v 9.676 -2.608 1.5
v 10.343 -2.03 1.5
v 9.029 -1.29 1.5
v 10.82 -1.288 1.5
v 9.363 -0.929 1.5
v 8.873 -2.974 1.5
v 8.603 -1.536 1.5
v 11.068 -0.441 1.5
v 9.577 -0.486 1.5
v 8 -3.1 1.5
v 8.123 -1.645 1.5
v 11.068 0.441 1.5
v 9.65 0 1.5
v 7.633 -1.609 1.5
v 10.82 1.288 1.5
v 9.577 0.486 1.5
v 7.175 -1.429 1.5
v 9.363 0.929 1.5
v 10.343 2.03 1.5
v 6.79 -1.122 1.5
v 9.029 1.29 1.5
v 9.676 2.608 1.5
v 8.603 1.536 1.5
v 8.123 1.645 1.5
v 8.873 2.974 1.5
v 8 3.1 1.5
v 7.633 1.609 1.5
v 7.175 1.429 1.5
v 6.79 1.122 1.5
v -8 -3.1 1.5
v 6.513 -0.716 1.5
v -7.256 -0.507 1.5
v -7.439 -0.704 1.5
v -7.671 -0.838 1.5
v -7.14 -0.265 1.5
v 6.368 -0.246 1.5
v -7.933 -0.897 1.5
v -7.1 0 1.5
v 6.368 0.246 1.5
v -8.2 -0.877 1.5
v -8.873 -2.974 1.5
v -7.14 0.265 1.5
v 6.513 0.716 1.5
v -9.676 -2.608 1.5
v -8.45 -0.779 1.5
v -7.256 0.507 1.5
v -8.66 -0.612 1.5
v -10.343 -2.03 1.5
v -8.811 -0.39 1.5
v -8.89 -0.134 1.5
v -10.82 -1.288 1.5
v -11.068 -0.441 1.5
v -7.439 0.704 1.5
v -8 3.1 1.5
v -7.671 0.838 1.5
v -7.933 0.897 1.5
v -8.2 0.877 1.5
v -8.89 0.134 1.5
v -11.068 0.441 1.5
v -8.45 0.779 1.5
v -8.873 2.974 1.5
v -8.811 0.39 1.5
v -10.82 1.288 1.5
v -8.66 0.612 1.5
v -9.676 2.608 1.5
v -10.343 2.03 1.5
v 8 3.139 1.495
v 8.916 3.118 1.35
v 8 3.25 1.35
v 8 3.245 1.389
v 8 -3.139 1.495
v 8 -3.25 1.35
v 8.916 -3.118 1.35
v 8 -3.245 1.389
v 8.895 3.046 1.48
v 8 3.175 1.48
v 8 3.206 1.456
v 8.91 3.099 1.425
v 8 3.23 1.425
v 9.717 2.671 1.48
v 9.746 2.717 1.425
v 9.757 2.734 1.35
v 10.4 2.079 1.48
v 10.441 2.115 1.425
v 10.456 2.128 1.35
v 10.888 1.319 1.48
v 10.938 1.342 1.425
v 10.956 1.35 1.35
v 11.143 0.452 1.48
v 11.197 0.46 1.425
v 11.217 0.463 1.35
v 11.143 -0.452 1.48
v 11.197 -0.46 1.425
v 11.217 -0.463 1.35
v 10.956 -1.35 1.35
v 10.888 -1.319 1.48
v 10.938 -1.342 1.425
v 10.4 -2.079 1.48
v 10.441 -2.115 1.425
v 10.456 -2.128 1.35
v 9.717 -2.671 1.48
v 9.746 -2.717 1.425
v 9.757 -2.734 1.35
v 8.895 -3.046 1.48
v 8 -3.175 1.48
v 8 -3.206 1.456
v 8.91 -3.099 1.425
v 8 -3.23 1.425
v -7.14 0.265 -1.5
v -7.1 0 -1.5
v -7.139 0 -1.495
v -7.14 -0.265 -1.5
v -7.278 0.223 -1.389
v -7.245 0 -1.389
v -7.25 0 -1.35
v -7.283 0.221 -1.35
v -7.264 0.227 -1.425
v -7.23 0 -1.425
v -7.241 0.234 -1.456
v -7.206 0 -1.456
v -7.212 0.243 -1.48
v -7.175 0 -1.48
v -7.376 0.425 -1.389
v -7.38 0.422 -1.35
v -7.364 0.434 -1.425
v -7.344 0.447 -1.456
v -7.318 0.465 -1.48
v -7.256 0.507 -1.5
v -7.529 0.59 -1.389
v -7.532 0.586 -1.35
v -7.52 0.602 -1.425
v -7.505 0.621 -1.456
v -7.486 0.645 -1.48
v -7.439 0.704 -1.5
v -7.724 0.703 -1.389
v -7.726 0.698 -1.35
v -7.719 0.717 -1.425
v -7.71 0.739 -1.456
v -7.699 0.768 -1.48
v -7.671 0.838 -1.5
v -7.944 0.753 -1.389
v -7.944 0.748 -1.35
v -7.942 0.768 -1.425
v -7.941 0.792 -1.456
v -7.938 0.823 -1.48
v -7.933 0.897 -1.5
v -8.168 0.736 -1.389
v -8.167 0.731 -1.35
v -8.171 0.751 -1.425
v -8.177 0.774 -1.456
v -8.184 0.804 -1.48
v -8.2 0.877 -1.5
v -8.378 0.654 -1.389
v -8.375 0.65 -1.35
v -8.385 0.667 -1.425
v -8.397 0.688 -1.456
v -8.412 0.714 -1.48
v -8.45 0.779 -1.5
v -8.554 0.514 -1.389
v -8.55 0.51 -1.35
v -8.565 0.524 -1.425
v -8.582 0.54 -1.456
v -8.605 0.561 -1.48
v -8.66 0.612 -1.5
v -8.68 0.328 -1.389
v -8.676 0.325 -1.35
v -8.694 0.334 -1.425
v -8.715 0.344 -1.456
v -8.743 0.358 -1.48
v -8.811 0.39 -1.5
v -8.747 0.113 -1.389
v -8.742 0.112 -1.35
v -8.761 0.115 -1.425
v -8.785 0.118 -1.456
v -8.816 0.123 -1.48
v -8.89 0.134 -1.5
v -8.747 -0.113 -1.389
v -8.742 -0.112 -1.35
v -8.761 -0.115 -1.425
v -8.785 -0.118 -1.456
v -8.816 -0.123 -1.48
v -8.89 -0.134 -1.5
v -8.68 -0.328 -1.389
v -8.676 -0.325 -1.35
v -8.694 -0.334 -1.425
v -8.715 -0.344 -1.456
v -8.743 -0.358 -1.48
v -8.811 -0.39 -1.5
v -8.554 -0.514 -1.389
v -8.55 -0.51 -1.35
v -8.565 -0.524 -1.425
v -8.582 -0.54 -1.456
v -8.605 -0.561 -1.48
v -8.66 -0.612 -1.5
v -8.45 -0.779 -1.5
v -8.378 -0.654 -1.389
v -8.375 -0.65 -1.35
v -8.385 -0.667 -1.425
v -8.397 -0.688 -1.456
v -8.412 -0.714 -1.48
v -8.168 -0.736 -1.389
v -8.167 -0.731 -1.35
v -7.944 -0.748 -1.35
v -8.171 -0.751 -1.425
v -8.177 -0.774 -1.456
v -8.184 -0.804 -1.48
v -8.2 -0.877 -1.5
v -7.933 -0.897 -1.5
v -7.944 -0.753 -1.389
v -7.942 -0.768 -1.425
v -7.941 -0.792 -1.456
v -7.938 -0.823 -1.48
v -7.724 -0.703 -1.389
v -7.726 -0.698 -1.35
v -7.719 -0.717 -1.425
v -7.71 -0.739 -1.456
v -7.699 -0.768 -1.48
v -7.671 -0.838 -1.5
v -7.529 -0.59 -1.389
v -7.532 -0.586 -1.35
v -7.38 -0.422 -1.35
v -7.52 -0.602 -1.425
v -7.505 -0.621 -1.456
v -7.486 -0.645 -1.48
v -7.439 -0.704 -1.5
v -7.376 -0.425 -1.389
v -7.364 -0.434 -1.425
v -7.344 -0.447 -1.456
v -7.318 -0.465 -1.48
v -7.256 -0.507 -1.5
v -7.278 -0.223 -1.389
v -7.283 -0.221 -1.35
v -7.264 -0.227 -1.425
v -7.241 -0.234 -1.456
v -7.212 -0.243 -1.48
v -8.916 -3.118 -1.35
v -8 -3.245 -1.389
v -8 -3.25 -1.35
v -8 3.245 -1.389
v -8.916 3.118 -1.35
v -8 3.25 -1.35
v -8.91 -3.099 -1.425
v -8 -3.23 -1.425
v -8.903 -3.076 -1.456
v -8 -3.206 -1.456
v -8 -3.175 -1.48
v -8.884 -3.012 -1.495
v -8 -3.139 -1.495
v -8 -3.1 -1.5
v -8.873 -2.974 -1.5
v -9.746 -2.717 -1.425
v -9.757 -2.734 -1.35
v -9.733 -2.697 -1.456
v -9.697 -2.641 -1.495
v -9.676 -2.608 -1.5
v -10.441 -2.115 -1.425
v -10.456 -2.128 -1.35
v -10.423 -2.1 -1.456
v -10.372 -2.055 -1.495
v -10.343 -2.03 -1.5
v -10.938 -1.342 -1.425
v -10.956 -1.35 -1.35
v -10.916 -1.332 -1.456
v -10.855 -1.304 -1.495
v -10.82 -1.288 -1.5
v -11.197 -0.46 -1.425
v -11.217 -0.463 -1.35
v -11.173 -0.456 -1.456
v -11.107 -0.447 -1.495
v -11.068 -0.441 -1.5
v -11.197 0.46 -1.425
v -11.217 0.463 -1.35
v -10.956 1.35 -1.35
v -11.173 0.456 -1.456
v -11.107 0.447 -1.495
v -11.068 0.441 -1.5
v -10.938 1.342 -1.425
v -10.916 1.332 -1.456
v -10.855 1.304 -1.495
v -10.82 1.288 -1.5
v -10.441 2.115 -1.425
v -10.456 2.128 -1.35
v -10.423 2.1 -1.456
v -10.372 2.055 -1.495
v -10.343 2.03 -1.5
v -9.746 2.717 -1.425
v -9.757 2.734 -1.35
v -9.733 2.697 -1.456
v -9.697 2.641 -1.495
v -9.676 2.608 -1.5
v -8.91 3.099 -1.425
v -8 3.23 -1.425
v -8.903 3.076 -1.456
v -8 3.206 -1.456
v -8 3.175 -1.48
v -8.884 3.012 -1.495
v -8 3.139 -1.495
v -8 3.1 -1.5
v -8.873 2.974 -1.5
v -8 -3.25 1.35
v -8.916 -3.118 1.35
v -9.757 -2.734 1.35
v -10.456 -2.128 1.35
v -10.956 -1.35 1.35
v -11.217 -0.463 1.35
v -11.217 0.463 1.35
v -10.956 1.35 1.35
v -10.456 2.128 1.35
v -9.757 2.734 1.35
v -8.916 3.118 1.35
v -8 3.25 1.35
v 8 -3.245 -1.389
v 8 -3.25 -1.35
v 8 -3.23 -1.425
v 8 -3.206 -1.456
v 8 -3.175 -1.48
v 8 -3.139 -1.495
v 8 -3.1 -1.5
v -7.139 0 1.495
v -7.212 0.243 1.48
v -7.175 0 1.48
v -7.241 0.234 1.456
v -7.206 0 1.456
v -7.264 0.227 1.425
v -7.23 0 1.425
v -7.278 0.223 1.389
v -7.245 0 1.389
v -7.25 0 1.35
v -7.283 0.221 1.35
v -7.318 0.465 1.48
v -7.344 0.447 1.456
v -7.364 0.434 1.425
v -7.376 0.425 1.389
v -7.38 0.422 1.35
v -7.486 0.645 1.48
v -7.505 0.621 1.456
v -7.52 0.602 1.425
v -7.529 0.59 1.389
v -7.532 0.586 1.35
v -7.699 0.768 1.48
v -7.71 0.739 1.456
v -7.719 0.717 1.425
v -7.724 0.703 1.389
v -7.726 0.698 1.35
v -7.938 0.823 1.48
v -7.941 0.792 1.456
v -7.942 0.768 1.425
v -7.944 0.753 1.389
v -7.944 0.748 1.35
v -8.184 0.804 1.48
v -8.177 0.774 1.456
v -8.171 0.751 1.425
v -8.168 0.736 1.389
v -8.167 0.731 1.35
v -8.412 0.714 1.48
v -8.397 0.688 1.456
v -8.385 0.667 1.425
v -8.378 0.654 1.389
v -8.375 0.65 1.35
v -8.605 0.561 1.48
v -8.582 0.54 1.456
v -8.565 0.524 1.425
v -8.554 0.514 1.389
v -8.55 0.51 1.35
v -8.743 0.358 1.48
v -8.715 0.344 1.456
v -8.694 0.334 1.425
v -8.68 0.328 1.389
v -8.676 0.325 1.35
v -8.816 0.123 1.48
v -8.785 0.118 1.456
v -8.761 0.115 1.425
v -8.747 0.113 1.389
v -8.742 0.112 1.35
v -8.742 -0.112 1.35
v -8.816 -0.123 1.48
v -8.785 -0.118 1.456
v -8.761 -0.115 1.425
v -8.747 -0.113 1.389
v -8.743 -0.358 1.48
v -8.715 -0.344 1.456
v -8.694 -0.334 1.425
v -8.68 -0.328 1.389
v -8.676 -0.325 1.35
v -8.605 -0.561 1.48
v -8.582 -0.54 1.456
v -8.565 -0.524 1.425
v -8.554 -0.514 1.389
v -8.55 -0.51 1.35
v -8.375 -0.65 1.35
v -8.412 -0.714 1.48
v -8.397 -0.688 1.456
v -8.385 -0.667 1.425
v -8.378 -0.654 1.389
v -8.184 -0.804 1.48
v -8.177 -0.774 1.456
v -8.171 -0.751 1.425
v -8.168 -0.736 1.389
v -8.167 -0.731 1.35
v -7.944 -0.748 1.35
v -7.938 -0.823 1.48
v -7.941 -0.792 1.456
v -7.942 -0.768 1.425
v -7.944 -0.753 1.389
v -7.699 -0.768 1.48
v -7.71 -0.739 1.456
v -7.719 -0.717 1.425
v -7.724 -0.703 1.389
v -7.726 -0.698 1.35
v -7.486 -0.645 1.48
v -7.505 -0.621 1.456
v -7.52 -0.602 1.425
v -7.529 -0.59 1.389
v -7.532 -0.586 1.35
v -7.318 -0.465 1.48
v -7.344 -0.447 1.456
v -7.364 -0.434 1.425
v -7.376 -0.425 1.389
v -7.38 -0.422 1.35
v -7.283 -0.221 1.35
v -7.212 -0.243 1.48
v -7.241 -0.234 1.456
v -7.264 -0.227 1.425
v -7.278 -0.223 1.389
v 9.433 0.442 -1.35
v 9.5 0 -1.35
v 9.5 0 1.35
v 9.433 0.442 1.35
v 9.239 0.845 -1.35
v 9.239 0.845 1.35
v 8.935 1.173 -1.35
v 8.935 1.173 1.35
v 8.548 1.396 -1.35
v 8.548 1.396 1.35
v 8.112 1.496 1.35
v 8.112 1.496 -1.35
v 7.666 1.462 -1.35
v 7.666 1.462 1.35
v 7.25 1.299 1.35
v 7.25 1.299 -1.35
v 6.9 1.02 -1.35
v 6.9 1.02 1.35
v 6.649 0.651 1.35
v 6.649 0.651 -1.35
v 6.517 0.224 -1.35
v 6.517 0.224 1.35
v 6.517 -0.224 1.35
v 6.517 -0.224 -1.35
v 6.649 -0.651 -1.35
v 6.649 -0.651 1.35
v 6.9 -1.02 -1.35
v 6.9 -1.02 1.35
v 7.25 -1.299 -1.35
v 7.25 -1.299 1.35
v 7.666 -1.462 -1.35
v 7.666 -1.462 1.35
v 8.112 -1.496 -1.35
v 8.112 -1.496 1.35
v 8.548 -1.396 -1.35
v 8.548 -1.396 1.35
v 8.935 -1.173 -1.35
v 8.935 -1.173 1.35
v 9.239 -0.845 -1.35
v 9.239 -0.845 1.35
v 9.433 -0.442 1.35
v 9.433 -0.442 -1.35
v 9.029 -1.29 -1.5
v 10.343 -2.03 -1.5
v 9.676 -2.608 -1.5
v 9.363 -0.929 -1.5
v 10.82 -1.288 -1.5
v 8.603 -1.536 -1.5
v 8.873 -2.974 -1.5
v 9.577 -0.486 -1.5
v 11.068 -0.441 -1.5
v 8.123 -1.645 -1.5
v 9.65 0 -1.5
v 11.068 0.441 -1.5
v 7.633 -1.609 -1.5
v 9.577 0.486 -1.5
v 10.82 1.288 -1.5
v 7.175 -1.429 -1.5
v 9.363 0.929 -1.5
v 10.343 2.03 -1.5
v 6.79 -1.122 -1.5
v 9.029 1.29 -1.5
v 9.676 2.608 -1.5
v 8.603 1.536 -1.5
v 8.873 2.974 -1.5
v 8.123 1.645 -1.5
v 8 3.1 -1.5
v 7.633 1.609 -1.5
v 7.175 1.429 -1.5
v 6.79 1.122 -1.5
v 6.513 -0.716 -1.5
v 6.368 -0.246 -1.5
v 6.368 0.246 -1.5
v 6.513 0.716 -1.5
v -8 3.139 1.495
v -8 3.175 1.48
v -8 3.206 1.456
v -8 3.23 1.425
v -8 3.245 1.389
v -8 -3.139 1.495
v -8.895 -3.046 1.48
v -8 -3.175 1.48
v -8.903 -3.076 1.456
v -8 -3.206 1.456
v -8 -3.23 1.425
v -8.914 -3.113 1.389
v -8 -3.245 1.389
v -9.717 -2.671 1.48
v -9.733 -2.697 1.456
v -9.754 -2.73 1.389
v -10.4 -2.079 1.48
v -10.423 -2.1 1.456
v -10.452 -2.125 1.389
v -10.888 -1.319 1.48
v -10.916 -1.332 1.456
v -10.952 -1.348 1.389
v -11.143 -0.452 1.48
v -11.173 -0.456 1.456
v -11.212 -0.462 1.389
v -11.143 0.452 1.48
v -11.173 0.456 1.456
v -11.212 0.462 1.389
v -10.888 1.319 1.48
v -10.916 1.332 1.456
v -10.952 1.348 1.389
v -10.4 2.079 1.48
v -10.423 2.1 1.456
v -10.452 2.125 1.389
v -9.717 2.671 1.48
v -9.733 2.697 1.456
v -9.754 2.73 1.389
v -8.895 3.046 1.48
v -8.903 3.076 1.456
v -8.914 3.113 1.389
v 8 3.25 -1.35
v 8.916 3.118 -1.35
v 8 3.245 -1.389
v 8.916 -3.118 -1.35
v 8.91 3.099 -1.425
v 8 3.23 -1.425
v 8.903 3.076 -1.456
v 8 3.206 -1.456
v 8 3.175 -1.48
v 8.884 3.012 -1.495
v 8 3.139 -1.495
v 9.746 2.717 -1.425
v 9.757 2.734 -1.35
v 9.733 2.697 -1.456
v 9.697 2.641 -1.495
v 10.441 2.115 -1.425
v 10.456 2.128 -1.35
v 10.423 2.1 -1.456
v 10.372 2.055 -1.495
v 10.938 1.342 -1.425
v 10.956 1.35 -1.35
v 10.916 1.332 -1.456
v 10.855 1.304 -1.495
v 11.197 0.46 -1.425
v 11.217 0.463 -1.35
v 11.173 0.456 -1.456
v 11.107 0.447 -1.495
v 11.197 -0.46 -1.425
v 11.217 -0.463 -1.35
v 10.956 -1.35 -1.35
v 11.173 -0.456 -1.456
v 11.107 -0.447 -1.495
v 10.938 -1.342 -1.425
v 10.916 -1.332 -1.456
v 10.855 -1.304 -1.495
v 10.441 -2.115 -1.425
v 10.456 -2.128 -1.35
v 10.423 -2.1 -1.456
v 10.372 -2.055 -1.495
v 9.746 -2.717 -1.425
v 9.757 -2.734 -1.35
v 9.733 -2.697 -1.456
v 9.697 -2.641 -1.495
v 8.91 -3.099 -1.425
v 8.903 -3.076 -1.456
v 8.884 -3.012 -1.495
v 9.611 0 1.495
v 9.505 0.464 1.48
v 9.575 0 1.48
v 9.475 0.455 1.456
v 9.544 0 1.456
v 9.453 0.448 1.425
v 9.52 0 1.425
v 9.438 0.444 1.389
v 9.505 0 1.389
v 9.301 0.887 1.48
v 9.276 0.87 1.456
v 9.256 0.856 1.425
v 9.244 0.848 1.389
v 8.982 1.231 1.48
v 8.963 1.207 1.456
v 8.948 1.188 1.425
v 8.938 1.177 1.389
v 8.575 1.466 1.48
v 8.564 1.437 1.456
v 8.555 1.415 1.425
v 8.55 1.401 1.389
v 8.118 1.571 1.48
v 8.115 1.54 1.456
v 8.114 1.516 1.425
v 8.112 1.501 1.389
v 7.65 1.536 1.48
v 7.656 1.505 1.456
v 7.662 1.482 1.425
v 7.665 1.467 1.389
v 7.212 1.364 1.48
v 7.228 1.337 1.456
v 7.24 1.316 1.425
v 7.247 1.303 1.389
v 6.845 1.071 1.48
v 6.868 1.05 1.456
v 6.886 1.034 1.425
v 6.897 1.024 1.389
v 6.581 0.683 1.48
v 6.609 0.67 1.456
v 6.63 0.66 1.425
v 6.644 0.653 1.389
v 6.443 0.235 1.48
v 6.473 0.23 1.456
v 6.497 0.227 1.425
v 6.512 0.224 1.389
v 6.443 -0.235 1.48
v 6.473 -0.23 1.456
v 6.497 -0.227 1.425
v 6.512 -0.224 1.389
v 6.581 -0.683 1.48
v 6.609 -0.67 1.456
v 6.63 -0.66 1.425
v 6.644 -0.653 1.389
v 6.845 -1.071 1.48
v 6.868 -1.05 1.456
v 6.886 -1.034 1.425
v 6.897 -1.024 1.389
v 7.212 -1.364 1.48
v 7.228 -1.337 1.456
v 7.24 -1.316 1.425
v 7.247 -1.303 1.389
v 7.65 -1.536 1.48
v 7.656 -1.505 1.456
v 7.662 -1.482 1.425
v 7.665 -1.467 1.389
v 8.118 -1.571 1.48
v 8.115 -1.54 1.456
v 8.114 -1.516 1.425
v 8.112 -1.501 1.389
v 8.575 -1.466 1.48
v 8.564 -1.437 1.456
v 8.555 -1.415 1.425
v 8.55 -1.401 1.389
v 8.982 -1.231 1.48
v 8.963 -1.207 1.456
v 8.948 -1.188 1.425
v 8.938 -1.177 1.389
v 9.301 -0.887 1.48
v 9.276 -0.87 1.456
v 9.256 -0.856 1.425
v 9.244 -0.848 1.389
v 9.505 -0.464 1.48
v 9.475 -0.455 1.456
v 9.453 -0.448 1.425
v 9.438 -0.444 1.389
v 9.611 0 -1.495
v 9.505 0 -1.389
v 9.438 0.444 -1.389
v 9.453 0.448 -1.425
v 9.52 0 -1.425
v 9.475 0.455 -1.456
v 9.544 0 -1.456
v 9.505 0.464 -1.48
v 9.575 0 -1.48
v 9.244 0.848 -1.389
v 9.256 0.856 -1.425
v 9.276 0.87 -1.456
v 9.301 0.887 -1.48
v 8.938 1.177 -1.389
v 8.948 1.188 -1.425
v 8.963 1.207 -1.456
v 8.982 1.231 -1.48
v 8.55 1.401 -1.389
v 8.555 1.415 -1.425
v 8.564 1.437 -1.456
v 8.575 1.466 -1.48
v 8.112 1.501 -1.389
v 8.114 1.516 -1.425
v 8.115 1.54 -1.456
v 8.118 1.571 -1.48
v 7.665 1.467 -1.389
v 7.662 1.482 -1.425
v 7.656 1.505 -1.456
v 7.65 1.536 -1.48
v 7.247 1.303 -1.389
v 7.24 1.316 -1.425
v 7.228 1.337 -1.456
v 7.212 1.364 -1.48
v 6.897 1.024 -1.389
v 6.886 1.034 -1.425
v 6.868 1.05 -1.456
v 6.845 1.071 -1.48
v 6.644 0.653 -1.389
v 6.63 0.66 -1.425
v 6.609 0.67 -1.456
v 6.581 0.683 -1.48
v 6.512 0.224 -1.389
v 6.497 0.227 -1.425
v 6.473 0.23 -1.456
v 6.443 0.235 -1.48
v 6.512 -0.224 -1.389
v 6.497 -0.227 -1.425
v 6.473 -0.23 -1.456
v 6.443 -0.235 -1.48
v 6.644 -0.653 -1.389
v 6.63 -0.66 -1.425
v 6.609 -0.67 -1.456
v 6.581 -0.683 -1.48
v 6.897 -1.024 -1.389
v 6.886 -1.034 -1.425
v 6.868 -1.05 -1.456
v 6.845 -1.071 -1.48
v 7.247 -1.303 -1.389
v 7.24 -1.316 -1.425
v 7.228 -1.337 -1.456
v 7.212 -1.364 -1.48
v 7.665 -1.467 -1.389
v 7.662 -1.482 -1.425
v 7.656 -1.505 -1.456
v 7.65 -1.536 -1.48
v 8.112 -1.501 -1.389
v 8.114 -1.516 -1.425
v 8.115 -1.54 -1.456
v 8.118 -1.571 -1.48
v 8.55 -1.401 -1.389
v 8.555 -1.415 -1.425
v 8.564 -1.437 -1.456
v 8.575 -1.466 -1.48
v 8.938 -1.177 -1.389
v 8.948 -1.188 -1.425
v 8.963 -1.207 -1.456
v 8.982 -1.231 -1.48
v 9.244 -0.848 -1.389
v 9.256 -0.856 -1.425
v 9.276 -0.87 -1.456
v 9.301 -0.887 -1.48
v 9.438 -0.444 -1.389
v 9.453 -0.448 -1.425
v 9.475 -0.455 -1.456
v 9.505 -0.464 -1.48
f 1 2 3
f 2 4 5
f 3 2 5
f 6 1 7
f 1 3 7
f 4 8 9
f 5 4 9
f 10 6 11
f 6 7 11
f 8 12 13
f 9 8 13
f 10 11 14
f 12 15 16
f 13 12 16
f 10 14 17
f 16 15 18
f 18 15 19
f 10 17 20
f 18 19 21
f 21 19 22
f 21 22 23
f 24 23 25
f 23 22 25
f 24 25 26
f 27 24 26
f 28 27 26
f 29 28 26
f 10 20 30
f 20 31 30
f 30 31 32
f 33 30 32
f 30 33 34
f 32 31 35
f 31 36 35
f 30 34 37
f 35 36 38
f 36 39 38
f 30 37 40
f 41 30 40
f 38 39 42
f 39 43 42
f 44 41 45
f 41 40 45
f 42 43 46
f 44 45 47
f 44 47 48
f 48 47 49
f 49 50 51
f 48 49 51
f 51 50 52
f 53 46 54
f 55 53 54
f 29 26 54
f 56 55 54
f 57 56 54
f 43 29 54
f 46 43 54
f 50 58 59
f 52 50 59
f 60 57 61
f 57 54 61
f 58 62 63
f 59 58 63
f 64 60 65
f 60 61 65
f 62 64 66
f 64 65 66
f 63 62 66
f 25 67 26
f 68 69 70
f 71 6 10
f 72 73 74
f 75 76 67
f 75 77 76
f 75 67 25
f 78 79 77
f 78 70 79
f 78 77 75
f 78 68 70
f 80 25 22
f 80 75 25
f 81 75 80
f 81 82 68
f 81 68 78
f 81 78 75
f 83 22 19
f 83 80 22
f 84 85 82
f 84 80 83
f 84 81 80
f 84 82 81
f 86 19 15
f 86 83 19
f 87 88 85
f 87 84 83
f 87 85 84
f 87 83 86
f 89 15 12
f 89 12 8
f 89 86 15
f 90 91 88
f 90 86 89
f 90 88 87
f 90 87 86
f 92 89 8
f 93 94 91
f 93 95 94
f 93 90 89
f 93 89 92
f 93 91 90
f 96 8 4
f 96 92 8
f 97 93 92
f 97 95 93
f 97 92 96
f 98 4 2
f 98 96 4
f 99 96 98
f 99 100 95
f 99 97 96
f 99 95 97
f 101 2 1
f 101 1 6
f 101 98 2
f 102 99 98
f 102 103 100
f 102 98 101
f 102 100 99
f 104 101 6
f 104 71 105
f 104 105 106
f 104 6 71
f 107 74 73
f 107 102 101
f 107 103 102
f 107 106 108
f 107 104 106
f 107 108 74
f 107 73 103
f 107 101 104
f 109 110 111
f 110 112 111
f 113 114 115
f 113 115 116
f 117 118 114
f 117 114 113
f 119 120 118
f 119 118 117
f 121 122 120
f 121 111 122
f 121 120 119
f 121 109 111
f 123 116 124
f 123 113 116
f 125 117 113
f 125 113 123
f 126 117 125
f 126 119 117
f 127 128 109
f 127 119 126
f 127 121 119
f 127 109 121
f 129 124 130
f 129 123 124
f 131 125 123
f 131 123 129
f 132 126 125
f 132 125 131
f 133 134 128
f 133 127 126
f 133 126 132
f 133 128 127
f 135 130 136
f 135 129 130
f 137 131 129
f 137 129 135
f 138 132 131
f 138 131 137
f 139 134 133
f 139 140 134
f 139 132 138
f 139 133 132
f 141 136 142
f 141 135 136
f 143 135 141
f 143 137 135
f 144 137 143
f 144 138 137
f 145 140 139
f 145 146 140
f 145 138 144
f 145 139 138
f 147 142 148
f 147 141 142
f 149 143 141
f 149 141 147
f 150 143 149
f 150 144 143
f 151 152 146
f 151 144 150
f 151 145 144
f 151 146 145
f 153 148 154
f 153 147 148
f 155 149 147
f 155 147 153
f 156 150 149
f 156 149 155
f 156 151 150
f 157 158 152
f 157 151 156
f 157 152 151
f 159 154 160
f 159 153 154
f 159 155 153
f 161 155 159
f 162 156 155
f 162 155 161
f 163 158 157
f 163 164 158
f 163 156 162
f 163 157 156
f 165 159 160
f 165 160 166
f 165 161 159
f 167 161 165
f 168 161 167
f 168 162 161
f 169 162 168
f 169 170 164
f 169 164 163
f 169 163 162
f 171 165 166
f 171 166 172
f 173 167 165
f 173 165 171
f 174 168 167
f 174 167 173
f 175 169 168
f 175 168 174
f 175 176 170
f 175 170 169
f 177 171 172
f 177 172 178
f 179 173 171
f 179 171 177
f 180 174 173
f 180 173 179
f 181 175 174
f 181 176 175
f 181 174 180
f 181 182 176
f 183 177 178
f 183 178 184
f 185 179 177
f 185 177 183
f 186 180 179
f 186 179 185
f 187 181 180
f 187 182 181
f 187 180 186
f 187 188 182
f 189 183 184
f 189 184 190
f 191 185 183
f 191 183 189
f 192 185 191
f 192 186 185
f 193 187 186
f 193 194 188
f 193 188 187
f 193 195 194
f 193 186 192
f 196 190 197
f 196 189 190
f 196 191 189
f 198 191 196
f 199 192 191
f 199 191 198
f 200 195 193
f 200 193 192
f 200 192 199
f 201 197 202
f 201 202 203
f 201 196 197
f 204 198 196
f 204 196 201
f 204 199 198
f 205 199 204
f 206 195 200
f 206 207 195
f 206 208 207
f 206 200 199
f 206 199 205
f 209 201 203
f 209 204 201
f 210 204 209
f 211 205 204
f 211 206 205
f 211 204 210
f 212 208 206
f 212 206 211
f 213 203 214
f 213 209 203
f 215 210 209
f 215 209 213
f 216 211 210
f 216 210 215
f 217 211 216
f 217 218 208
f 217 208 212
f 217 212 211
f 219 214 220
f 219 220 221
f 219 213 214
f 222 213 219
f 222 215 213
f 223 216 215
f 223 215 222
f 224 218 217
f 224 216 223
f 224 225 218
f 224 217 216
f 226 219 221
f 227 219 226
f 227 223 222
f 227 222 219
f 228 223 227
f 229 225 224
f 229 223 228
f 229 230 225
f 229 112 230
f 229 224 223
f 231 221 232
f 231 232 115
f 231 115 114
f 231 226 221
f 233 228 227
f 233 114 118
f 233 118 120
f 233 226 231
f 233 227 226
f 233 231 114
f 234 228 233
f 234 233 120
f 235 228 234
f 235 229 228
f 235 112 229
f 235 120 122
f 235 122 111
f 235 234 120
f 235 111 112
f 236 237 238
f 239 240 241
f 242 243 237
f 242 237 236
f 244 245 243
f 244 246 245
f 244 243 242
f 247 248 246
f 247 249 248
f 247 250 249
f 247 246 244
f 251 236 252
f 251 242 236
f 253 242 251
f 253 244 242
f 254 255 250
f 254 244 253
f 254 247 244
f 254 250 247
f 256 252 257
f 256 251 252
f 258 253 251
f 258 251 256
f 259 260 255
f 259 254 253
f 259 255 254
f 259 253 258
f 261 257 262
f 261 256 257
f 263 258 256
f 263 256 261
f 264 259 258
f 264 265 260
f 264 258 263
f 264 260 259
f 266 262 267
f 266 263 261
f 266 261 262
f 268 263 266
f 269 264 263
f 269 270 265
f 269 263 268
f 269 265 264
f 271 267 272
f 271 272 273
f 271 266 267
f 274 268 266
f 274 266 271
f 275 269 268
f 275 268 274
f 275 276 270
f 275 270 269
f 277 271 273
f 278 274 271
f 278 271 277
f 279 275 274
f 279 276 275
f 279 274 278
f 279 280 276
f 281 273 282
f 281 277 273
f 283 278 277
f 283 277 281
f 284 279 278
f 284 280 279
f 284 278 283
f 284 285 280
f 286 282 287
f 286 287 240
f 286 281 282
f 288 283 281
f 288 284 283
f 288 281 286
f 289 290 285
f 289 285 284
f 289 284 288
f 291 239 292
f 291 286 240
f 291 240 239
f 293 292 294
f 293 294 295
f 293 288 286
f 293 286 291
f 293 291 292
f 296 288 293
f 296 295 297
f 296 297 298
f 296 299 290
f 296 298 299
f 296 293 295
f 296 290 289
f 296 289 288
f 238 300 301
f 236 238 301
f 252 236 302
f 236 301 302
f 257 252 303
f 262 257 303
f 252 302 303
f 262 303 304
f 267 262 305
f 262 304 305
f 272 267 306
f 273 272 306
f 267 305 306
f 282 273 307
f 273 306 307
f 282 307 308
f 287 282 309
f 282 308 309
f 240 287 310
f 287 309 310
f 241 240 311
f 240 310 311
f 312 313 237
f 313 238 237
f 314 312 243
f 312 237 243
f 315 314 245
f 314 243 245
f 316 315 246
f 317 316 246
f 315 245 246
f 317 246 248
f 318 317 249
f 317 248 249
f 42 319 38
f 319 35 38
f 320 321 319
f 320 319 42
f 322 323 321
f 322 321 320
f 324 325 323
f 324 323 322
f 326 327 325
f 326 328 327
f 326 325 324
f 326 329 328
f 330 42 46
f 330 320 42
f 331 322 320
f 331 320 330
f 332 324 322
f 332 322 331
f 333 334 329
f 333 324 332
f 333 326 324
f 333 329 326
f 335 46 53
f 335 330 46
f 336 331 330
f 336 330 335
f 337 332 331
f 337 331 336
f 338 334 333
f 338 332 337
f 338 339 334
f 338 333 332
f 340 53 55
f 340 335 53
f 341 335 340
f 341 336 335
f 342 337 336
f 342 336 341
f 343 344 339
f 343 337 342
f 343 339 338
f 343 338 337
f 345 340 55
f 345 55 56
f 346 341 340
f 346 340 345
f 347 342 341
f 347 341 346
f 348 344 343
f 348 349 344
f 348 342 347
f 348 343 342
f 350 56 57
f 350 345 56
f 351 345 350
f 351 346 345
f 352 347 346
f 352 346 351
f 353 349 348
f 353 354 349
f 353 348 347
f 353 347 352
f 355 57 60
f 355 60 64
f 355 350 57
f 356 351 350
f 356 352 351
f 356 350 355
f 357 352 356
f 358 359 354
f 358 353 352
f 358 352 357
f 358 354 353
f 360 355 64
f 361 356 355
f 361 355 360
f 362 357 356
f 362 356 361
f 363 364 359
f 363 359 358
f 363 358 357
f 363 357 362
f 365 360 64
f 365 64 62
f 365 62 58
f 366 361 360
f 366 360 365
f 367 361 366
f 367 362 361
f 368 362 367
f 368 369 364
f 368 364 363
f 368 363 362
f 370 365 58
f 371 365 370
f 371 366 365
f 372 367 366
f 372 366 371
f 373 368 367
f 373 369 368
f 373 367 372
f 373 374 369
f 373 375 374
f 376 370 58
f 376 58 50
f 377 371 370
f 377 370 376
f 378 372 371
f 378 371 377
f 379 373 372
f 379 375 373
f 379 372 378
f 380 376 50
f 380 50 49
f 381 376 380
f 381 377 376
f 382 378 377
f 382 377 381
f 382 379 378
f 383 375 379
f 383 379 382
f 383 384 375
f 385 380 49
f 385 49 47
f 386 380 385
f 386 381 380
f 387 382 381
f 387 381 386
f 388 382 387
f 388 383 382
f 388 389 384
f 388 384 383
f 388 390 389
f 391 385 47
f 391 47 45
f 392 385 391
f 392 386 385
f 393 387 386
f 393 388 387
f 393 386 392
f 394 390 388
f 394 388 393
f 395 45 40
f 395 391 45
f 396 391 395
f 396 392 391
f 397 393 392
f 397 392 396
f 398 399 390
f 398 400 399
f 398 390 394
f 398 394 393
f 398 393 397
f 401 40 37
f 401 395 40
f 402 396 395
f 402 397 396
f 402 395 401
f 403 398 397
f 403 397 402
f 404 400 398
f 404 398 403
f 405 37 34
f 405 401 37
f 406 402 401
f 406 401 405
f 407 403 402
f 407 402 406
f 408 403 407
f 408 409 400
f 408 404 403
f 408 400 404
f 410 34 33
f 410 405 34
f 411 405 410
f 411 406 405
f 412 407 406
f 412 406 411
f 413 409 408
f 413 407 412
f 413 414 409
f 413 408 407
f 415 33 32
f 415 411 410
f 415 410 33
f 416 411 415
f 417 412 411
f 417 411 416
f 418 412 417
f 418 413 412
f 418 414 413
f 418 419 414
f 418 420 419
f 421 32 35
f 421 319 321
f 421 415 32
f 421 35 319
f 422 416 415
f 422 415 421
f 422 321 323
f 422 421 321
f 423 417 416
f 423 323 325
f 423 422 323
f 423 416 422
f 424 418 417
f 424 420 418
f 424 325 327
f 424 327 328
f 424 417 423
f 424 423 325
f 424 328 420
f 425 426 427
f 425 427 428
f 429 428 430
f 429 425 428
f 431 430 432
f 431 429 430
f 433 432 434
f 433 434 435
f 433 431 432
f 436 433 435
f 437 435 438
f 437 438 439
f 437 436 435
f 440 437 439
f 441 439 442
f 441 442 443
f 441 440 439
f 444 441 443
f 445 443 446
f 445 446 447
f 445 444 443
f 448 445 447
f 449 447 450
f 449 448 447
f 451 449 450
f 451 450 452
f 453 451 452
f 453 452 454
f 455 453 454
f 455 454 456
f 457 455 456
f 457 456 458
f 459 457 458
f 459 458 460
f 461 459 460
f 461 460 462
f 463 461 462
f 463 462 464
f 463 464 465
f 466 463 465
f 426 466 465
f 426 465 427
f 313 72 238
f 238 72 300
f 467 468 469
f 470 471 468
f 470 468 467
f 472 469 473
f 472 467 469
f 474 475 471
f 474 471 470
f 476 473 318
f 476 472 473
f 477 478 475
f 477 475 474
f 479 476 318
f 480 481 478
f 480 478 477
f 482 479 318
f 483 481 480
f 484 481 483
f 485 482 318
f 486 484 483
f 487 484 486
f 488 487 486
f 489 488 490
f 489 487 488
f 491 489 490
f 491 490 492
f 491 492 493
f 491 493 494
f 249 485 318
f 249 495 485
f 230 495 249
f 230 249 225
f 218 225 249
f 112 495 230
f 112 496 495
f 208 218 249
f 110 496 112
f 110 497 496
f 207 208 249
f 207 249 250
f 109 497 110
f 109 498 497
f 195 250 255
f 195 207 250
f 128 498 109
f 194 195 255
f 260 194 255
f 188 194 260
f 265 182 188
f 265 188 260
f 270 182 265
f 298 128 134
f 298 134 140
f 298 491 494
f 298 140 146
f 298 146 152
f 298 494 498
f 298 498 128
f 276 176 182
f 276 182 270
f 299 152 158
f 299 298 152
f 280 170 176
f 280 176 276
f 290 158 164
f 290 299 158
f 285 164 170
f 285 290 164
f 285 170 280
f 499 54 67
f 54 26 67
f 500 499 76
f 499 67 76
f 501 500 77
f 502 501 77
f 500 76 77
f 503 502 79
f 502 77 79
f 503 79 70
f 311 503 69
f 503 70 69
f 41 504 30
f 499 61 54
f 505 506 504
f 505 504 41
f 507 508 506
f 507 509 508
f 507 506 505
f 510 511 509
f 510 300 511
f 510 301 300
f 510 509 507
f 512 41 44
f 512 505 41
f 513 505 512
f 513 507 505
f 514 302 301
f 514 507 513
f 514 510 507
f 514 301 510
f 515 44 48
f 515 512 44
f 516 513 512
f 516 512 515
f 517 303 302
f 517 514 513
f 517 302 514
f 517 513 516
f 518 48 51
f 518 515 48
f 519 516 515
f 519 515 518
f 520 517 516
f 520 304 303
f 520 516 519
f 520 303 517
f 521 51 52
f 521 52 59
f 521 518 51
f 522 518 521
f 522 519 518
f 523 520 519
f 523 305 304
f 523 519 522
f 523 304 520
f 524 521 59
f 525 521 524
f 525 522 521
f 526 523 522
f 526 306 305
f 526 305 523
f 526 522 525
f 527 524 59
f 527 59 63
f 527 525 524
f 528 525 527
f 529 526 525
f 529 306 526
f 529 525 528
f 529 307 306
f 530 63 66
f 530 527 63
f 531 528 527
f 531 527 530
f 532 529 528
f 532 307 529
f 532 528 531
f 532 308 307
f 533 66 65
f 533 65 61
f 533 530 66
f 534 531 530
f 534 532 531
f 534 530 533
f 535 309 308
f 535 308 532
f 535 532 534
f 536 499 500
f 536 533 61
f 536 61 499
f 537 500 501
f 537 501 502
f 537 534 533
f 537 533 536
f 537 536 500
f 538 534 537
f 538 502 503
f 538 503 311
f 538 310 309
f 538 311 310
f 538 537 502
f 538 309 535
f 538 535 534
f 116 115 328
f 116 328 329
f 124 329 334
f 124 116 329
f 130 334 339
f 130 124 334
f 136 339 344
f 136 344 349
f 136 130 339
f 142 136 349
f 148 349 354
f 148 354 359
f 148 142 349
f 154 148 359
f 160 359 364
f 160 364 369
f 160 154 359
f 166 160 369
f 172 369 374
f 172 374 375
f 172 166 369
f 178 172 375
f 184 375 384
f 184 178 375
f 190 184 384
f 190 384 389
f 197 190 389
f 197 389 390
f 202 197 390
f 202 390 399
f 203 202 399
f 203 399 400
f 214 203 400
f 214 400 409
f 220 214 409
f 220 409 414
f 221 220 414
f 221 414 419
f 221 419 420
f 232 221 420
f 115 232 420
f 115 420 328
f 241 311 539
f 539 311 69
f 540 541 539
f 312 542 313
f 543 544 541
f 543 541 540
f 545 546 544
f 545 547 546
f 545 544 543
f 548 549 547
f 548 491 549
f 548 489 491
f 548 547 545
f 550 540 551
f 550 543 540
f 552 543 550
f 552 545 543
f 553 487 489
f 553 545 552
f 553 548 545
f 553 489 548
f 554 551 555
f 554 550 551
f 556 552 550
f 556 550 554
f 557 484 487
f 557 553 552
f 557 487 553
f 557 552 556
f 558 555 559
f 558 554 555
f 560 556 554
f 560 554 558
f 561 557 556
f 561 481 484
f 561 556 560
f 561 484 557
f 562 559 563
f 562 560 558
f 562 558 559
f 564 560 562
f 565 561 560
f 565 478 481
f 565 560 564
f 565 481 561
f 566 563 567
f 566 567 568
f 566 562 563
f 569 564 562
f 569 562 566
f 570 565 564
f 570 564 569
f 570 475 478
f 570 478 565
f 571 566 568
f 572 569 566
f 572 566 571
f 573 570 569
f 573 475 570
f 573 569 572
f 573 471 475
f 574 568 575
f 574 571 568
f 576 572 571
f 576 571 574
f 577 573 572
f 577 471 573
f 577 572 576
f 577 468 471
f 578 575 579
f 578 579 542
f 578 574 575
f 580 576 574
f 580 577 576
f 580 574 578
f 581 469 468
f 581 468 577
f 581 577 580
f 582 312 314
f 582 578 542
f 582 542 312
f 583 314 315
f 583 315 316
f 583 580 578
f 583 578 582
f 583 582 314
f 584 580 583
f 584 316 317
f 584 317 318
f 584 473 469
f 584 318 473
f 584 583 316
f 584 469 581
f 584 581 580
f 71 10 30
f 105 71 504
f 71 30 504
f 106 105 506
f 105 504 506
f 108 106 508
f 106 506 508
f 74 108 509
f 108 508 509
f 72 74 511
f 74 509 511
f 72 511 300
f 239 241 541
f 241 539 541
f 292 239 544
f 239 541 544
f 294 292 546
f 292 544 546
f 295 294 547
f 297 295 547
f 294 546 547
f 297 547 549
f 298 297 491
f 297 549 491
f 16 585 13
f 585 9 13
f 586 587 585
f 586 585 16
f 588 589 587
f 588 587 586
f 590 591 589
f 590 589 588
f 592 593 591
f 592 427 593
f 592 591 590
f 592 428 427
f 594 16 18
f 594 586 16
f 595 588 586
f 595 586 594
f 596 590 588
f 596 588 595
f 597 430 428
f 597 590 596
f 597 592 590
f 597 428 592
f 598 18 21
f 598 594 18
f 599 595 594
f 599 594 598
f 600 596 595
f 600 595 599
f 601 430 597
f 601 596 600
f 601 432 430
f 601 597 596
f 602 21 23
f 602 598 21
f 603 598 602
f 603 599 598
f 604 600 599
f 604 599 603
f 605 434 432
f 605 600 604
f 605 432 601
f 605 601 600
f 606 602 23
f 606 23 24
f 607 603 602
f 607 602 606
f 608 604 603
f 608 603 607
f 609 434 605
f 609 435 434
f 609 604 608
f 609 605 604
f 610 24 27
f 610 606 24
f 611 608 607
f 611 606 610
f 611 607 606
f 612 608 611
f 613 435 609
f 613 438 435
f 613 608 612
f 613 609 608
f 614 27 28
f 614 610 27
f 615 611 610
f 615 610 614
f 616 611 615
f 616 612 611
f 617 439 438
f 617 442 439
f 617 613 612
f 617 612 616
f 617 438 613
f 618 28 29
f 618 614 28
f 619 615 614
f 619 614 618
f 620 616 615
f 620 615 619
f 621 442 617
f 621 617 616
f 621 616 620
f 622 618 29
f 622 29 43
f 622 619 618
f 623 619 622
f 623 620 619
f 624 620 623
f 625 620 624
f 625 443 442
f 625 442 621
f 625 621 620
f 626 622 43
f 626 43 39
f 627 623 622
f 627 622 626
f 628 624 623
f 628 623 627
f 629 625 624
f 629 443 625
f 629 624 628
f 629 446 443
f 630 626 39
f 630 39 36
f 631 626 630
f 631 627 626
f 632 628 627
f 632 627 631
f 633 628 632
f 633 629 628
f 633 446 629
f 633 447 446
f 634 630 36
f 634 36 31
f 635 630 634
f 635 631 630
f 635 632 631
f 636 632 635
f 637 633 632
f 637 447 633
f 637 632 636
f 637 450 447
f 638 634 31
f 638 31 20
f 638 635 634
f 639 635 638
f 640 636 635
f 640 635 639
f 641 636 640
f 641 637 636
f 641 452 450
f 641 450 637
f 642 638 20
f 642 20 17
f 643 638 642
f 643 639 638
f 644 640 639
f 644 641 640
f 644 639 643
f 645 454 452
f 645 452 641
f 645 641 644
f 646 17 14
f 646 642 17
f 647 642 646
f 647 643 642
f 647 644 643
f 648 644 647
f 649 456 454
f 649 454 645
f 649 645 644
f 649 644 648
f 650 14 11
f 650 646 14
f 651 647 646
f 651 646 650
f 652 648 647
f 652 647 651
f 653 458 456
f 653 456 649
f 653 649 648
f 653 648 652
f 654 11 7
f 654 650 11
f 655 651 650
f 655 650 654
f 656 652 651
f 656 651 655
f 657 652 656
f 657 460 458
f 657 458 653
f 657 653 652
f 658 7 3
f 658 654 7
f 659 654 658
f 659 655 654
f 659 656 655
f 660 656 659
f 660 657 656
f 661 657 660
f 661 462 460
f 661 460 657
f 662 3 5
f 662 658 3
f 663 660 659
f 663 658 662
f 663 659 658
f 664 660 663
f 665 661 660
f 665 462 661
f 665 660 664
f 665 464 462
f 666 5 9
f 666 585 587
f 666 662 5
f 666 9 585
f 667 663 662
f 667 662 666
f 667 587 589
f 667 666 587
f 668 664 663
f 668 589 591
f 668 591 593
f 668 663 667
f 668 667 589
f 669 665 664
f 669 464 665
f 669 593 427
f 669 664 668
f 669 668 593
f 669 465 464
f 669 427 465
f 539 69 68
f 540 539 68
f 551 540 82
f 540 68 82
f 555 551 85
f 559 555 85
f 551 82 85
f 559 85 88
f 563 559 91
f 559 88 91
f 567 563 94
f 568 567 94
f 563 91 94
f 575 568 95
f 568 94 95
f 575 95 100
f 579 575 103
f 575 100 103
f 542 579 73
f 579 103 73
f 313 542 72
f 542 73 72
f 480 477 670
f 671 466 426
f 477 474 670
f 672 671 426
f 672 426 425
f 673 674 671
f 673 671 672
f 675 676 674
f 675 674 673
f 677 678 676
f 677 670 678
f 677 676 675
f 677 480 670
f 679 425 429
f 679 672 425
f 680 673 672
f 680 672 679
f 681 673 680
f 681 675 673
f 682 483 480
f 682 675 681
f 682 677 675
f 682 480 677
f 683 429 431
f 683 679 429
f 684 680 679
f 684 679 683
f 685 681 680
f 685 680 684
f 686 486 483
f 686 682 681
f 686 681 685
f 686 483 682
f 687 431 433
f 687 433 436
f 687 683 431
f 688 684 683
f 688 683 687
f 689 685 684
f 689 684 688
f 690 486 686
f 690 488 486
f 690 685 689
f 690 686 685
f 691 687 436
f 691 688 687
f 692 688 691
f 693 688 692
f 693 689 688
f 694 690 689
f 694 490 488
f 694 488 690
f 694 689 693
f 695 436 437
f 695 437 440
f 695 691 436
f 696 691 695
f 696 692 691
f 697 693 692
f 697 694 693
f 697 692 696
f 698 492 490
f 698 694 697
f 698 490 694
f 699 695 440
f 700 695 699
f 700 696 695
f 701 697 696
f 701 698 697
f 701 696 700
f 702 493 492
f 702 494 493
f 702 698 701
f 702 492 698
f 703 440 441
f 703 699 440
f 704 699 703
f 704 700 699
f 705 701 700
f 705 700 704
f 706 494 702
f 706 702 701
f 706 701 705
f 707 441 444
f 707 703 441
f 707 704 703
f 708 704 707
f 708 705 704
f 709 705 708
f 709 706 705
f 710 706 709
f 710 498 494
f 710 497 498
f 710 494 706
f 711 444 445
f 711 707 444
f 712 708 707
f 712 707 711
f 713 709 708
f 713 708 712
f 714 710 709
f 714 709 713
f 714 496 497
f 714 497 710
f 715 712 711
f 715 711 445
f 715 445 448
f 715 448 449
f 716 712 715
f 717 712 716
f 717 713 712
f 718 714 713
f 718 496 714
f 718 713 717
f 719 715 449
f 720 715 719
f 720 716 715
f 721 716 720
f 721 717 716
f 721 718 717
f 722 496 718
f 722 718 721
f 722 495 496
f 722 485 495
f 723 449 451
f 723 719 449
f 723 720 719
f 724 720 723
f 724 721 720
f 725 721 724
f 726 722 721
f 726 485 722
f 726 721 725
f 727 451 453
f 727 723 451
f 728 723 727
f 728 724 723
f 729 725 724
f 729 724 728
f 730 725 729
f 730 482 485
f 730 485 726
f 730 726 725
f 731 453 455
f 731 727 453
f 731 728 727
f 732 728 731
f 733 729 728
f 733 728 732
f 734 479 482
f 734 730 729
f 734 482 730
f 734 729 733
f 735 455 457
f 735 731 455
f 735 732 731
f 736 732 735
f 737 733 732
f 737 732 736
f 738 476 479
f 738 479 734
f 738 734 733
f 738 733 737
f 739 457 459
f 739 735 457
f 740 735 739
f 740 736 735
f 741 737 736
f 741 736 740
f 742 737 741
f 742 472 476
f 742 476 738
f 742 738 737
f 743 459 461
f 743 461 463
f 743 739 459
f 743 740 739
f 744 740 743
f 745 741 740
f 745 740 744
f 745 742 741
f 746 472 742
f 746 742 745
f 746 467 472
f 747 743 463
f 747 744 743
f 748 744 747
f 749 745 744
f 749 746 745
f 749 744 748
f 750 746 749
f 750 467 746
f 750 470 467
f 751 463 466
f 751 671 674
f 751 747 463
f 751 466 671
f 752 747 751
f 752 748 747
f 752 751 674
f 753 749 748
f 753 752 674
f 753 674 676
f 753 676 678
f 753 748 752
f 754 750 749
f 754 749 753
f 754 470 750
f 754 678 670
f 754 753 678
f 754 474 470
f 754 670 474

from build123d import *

# Parameters (mm, degrees)
SKETCH1_R           = 0.75
SKETCH1_R_2         = 1.5
BOSS_EXTRUDE1_DEPTH = 1.5
FILLET1_R           = 0.15


with BuildPart() as part:
    # Sketch1 → Boss-Extrude1 (new body, symmetric)
    with BuildSketch(Plane.XY):
        with BuildLine():
            Line((-8, 3.25), (8, 3.25))
            ThreePointArc((8, 3.25), (11.25, 0), (8, -3.25))
            Line((8, -3.25), (-8, -3.25))
            ThreePointArc((-8, -3.25), (-11.25, 0), (-8, 3.25))
        make_face()
        with Locations((-8, 0)):
            Circle(SKETCH1_R, mode=Mode.SUBTRACT)
        with Locations((8, 0)):
            Circle(SKETCH1_R_2, mode=Mode.SUBTRACT)
    extrude(amount=BOSS_EXTRUDE1_DEPTH, both=True)

    # Fillet1
    fillet1_edges = [part.edges().sort_by_distance(p)[0] for p in [
        (-8.75, 0, -1.5),
        (-8.75, 0, 1.5),
        (11.25, 0, 1.5),
        (6.5, 0, -1.5),
        (6.5, 0, 1.5),
        (0, 3.25, 1.5),
        (-11.25, 0, 1.5),
        (0, 3.25, -1.5),
        (11.25, 0, -1.5),
        (0, -3.25, -1.5),
        (-11.25, 0, -1.5),
        (0, -3.25, 1.5),
    ]]
    fillet(fillet1_edges, radius=FILLET1_R)


solid = part.part
